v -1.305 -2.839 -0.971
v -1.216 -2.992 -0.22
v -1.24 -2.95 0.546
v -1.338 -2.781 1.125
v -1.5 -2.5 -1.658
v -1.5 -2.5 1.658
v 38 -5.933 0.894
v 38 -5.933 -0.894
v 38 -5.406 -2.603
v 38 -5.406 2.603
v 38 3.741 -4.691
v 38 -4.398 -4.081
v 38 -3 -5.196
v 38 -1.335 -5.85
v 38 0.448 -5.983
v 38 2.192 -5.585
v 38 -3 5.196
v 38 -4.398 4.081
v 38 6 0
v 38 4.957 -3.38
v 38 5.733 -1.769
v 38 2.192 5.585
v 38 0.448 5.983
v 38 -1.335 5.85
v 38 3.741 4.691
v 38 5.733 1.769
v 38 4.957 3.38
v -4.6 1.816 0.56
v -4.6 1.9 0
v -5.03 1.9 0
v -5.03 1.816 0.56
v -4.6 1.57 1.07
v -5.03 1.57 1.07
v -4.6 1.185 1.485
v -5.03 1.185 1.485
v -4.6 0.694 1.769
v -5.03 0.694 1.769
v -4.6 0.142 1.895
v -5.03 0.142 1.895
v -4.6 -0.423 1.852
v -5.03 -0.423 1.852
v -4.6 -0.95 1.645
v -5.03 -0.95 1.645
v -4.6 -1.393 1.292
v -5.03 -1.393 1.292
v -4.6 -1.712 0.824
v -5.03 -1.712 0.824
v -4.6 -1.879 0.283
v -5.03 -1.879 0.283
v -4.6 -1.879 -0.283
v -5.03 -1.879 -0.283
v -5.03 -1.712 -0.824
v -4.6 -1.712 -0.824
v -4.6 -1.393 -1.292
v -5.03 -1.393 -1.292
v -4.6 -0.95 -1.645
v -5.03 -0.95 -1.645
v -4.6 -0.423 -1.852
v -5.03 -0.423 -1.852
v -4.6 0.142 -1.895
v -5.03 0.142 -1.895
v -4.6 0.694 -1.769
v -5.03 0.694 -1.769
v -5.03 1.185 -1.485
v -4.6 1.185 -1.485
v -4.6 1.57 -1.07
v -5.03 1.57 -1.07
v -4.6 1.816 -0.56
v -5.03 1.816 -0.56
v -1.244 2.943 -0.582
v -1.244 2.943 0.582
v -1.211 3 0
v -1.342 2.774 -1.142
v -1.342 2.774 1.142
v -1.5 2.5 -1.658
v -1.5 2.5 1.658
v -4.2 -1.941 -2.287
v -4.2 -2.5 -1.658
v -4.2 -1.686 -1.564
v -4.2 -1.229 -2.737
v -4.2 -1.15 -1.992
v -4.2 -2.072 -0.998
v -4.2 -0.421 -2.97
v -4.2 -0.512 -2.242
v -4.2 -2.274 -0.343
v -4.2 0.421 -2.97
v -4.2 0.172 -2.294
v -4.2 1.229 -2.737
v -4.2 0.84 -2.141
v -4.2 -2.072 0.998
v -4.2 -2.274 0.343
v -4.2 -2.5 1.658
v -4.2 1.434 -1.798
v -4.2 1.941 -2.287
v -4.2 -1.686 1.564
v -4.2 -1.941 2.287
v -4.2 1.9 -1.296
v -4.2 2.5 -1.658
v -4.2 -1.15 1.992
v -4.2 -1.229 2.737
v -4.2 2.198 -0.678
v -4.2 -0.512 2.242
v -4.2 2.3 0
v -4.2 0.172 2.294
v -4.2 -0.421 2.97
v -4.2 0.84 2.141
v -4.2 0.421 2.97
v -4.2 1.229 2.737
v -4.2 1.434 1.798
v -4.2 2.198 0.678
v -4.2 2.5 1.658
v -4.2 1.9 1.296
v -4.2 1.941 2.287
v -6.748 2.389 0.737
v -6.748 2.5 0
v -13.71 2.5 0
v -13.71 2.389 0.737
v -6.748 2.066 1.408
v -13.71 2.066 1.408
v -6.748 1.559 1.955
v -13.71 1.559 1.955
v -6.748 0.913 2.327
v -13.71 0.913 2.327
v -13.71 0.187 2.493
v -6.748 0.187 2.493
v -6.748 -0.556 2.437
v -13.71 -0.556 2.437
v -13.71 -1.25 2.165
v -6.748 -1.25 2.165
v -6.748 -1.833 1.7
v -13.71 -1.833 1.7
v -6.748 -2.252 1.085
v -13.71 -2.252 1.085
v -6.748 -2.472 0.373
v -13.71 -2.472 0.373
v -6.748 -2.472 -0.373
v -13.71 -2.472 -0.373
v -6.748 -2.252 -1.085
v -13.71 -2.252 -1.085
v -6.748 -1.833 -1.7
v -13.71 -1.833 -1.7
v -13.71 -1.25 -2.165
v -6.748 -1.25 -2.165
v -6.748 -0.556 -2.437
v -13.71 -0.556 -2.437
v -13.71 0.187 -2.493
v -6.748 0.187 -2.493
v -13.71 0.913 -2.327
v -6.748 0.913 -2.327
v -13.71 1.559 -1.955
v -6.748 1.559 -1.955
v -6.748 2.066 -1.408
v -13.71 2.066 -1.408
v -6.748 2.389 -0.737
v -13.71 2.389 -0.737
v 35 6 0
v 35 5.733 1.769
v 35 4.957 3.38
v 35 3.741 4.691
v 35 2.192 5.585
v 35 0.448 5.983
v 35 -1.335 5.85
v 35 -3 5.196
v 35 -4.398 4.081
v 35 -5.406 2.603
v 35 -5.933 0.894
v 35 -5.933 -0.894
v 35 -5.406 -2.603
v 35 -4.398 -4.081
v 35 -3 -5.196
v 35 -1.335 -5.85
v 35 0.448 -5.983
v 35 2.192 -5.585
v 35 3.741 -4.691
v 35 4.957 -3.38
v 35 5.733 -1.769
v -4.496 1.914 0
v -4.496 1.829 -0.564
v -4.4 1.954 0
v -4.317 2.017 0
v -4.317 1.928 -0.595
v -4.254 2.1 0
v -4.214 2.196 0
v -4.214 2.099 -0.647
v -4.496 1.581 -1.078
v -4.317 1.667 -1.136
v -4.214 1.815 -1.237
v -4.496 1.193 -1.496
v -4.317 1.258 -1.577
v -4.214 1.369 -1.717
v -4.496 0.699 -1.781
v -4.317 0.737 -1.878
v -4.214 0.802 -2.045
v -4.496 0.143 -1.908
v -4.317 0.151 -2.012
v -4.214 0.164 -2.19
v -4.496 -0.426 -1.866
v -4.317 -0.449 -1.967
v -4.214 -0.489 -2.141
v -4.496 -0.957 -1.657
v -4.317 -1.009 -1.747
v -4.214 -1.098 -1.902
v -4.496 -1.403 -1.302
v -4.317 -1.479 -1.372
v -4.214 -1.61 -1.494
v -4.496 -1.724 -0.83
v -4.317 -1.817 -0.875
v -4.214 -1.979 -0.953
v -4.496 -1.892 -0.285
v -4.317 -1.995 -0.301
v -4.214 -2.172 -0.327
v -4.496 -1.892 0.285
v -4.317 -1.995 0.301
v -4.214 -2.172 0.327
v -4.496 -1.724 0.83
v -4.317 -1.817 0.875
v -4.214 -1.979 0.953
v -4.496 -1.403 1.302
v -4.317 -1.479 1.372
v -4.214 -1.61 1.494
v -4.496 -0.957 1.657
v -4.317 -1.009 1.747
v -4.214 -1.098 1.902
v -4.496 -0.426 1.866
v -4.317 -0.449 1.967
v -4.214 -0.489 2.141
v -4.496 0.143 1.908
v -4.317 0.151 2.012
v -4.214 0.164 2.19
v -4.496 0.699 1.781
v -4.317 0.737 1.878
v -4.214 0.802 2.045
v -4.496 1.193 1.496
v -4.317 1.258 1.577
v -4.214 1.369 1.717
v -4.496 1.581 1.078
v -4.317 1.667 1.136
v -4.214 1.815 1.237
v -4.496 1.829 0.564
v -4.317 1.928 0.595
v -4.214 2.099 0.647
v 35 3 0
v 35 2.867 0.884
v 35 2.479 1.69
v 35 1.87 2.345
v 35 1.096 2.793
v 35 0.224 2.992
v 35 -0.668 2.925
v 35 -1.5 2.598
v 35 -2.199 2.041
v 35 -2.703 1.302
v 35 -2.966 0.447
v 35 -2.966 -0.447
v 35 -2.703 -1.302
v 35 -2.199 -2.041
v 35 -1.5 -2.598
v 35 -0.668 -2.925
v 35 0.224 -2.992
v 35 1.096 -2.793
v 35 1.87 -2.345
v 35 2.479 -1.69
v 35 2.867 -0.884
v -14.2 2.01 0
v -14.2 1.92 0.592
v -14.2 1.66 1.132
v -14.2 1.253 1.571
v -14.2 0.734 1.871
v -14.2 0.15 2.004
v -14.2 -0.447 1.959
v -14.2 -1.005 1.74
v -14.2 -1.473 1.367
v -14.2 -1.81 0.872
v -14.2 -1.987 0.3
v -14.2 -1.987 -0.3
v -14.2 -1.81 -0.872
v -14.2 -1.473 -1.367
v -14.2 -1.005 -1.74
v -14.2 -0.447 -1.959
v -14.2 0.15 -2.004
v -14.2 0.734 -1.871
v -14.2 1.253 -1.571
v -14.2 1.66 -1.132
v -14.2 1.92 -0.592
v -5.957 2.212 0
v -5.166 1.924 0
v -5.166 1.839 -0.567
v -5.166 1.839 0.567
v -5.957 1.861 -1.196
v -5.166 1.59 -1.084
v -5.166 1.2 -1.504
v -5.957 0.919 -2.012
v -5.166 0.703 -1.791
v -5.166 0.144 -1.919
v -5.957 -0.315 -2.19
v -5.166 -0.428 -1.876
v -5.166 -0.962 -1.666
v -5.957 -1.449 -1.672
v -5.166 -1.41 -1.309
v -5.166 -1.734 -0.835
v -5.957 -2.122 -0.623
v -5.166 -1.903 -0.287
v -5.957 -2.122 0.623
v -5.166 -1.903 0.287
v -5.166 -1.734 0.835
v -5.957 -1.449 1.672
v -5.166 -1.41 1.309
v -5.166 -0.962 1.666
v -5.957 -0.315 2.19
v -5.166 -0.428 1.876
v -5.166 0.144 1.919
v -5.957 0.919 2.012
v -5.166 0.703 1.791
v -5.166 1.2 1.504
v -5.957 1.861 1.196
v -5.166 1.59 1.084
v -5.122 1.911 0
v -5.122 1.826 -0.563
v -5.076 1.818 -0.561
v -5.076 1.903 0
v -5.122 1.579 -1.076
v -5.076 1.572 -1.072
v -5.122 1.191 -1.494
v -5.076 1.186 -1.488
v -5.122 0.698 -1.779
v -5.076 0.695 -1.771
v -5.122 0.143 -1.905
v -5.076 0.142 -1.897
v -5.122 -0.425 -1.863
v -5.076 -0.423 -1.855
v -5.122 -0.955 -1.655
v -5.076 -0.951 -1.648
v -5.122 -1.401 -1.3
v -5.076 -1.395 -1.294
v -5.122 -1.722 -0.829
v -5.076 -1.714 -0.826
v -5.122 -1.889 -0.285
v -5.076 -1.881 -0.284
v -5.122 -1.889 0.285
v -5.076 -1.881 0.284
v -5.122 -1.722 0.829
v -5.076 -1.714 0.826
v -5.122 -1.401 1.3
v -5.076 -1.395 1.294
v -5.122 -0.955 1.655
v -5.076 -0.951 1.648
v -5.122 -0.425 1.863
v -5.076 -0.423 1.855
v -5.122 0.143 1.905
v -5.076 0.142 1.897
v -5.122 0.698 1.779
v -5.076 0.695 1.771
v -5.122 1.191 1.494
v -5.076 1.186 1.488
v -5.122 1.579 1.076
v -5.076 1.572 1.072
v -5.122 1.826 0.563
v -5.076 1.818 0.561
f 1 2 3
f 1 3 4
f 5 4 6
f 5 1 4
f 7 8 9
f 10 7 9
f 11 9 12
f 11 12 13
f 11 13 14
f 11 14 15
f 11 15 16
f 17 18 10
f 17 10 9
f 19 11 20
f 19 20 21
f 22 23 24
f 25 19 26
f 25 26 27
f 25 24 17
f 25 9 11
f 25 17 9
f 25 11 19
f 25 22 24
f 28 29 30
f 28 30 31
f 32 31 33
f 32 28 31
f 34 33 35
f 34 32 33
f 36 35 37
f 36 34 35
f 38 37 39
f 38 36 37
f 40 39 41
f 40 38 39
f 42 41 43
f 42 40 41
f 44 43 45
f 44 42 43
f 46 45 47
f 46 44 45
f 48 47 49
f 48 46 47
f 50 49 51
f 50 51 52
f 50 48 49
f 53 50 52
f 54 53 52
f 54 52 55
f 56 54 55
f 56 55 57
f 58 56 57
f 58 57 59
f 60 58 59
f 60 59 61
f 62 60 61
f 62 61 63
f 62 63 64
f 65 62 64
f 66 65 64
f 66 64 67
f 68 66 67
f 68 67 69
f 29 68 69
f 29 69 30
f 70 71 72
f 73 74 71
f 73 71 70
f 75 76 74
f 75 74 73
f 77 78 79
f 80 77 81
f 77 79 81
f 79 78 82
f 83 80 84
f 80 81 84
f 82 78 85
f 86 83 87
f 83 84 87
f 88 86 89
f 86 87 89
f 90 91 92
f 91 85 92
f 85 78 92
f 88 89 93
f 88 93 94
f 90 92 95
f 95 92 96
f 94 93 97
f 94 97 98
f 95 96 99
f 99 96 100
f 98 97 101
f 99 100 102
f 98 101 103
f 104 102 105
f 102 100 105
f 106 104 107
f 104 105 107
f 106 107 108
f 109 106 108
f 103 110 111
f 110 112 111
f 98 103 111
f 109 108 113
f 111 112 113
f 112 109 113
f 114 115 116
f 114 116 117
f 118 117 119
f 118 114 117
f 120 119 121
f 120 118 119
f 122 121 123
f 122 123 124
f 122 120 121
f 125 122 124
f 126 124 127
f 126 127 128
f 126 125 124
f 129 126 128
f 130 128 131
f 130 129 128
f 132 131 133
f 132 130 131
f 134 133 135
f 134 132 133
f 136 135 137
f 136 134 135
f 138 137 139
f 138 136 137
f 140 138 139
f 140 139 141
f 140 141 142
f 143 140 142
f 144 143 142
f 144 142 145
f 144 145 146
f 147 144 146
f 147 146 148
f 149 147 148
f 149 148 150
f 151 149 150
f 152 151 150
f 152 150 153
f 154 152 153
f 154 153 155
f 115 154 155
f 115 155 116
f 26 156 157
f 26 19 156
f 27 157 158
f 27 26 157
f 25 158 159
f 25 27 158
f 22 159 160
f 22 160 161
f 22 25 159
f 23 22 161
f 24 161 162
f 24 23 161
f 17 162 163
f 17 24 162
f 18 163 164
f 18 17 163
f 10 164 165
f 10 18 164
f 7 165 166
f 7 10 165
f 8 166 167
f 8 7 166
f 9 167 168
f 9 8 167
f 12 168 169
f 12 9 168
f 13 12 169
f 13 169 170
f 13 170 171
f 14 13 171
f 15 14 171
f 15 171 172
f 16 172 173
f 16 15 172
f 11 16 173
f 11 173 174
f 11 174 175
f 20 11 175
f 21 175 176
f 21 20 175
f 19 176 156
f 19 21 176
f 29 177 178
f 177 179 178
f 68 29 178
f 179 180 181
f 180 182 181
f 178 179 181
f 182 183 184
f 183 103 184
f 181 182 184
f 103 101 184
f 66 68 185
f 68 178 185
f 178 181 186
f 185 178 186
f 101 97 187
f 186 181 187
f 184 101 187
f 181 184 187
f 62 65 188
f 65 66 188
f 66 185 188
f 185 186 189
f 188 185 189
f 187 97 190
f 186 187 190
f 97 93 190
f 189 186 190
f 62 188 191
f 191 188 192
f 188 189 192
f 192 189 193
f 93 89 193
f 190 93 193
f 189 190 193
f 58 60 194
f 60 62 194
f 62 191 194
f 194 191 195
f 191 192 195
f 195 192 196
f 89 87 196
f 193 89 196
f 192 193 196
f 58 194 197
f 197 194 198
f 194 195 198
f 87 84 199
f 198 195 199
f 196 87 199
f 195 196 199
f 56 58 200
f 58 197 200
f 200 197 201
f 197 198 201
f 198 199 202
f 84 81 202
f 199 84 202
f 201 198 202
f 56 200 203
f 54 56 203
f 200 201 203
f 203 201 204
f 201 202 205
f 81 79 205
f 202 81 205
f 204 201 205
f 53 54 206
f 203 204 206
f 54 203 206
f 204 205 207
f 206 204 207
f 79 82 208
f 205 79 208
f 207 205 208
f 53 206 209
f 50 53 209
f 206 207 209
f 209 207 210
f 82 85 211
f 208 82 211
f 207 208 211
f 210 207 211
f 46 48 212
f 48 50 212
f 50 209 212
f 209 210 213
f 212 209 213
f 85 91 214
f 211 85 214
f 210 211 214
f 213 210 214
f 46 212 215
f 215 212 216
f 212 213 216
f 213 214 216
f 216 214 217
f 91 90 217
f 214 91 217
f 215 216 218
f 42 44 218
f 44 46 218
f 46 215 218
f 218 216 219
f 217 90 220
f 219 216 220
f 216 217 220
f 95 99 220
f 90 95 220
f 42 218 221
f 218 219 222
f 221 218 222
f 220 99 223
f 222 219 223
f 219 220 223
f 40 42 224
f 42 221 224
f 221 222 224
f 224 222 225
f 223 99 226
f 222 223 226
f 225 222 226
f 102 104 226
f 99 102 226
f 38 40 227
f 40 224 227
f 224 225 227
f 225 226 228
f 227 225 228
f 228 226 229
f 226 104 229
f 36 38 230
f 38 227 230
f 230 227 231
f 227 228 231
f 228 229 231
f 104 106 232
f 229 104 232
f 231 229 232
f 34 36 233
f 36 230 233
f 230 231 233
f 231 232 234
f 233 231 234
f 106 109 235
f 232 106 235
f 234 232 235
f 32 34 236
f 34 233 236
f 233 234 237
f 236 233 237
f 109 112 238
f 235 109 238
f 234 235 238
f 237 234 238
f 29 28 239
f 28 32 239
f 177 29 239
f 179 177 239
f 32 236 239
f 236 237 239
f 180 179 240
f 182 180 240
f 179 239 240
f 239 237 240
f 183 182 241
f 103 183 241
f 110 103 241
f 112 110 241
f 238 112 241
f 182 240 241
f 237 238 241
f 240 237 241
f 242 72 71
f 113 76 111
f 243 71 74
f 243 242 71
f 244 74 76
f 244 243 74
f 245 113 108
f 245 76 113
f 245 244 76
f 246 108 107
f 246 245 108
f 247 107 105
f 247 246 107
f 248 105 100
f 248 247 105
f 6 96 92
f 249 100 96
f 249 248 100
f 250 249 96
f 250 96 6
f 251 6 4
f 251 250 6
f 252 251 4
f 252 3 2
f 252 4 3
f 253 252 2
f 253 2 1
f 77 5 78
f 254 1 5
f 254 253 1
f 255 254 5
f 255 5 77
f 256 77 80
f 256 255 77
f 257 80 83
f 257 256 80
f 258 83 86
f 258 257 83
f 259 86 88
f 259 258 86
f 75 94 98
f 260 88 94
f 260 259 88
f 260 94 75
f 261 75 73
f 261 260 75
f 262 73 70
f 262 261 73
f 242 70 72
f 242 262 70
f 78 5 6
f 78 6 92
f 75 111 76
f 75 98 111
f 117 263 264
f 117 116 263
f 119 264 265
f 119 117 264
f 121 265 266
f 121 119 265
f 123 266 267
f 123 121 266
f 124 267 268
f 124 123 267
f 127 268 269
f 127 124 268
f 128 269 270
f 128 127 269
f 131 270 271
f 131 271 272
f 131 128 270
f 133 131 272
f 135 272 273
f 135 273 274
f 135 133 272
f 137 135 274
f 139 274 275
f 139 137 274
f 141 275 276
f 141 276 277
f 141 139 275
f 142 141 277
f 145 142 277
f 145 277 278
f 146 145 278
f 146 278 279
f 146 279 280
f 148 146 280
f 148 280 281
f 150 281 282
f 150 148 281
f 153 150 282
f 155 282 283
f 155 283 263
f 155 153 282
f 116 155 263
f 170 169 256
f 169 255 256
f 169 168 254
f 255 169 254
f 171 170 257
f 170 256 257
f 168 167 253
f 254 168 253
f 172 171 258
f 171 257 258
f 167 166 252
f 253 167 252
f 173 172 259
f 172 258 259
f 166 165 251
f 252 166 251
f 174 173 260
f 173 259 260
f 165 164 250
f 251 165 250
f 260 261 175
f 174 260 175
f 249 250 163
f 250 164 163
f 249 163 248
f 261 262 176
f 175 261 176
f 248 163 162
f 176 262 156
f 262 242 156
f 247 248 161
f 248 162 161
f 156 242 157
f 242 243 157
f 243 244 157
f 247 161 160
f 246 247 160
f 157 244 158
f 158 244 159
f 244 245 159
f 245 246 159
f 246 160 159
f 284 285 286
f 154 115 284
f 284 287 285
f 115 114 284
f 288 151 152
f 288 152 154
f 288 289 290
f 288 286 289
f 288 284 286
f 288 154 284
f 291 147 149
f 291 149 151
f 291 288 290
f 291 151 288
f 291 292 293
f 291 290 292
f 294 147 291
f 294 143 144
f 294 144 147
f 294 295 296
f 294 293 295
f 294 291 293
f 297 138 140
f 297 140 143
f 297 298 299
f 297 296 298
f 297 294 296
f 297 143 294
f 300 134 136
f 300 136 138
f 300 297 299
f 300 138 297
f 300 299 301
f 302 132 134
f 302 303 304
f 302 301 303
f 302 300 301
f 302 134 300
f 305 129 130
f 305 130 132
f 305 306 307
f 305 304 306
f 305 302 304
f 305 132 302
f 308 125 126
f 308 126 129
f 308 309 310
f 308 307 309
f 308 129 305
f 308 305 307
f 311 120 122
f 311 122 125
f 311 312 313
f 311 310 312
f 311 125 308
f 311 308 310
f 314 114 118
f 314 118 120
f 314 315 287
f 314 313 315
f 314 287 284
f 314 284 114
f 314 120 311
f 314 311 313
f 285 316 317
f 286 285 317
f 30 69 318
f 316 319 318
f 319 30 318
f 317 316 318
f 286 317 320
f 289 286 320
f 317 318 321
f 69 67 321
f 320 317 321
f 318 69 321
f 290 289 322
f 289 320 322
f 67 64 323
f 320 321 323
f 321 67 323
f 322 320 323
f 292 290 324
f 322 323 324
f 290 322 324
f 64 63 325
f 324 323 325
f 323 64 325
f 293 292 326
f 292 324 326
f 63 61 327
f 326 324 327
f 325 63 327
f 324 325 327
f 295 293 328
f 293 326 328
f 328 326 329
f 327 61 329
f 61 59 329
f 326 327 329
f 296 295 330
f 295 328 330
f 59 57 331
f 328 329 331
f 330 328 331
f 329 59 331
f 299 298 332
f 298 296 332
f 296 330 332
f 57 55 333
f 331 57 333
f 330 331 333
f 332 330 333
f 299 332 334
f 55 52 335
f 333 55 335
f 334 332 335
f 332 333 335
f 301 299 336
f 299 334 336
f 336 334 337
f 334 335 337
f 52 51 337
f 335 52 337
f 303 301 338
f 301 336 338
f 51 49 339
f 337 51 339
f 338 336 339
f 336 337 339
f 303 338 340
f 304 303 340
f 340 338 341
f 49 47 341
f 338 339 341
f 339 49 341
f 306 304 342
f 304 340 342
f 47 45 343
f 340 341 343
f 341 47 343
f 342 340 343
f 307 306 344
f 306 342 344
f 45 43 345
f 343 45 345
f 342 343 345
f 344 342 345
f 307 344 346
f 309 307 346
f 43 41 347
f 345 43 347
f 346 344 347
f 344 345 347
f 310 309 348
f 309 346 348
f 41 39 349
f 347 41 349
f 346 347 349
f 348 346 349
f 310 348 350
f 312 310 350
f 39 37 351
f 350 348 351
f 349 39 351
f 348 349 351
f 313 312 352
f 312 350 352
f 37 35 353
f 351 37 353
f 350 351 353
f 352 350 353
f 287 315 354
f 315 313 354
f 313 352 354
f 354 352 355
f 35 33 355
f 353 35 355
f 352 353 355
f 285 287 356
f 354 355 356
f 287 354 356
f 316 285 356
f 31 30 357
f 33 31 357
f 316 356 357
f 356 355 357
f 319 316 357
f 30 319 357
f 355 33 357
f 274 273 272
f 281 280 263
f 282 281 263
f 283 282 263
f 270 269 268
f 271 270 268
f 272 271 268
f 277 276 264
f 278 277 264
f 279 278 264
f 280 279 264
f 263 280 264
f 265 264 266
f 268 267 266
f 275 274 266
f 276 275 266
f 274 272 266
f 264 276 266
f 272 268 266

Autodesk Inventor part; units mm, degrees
sketch "Sketch_1" plane through (0, 0, 0) normal (0, 0, 1) x (1, 0, 0)
  line L0 (38, 0) -> (-4.2, 0)
  line L1 (-4.2, 0) -> (-4.2, 3)
  line L2 (-4.2, 3) -> (38, 3)
  line L3 (38, 3) -> (38, 0)
  line L4 (38, 0) -> (-4.2, 0)
revolve "Revolution1" add sketch "Sketch_1" angle 360 about axis through (38, 0, 0) along (1, 0, 0)
sketch "Sketch_11" plane through (0, 0, 0) normal (0, 0, 1) x (1, 0, 0)
  line L0 (38, 0) -> (35, 0)
  line L1 (35, 0) -> (35, 6)
  line L2 (35, 6) -> (38, 6)
  line L3 (38, 6) -> (38, 0)
  line L4 (38, 0) -> (35, 0)
revolve "Revolution2" add sketch "Sketch_11" angle 360 about axis through (38, 0, 0) along (1, 0, 0)
sketch "Sketch_19" plane through (0, 0, 0) normal (0, 0, 1) x (1, 0, 0)
  line L0 (-3.2, 0) -> (-14.2, 0)
  line L1 (-14.2, 0) -> (-14.2, 2.0095)
  line L2 (-14.2, 2.0095) -> (-13.7095, 2.5)
  line L3 (-13.7095, 2.5) -> (-6.7485, 2.5)
  line L4 (-6.7485, 2.5) -> (-5.1663, 1.9241)
  arc A0 (-5.1663, 1.9241) -> (-5.0295, 1.9) centre (-5.0295, 2.3) ccw
  line L5 (-5.0295, 1.9) -> (-4.6, 1.9)
  arc A1 (-4.6, 1.9) -> (-4.2, 2.3) centre (-4.6, 2.3) ccw
  line L6 (-4.2, 2.3) -> (-4.2, 2.5)
  line L7 (-4.2, 2.5) -> (-3.2, 2.5)
  line L8 (-3.2, 2.5) -> (-3.2, 0)
  line L9 (-3.2, 0) -> (-14.2, 0)
revolve "Revolution3" add sketch "Sketch_19" angle 360 about axis through (-3.2, 0, 0) along (1, 0, 0)
thread "Thread1" size "M5x0.8" class "6g" standard "ISO Metric profile" full length
sketch "Sketch_20" plane through (0, 0, 0) normal (0, 0, 1) x (1, 0, 0)
  line L0 (-23.4, -10.5) -> (3.1188, -10.5)
  line L1 (3.1188, -10.5) -> (-1.5, -2.5)
  line L2 (-1.5, -2.5) -> (-4.2, -2.5)
  line L3 (-4.2, -2.5) -> (-4.2, -7.5)
  line L4 (-4.2, -7.5) -> (-19.2, -7.5)
  line L5 (-19.2, -7.5) -> (-19.2, 7.5)
  line L6 (-19.2, 7.5) -> (-4.2, 7.5)
  line L7 (-4.2, 7.5) -> (-4.2, 2.5)
  line L8 (-4.2, 2.5) -> (-1.5, 2.5)
  line L9 (-1.5, 2.5) -> (3.1188, 10.5)
  line L10 (3.1188, 10.5) -> (-23.4, 10.5)
  line L11 (-23.4, 10.5) -> (-23.4, -10.5)
extrude "Extrusion1" cut sketch "Sketch_20" along normal mid plane 12
ref_plane "FDT_PIRODACC_M1_XY" through (-9.9, 0, 0) normal (-1, 0, 0) x (0, 1, 0)
ref_plane "FDT_PIRODACC_M1_YZ" through (-9.9, 0, 0) normal (0, 1, 0) x (0, 0, -1)
ref_plane "FDT_PIRODACC_M1_ZX" through (-9.9, 0, 0) normal (0, 0, -1) x (-1, 0, 0)
ref_plane "NUT1_XY" through (-8.55, 0, 0) normal (1, 0, 0) x (0, 0, -1)
ref_plane "NUT1_YZ" through (-8.55, 0, 0) normal (0, 0, -1) x (0, 1, 0)
ref_plane "NUT1_ZX" through (-8.55, 0, 0) normal (0, 1, 0) x (1, 0, 0)
ref_plane "PISTON_XY" through (38, 0, 0) normal (1, 0, 0) x (0, 0, -1)
ref_plane "PISTON_YZ" through (38, 0, 0) normal (0, 0, -1) x (0, 1, 0)
ref_plane "PISTON_ZX" through (38, 0, 0) normal (0, 1, 0) x (1, 0, 0)
properties part number "536203 ADN-15-P-A_(KS)"
